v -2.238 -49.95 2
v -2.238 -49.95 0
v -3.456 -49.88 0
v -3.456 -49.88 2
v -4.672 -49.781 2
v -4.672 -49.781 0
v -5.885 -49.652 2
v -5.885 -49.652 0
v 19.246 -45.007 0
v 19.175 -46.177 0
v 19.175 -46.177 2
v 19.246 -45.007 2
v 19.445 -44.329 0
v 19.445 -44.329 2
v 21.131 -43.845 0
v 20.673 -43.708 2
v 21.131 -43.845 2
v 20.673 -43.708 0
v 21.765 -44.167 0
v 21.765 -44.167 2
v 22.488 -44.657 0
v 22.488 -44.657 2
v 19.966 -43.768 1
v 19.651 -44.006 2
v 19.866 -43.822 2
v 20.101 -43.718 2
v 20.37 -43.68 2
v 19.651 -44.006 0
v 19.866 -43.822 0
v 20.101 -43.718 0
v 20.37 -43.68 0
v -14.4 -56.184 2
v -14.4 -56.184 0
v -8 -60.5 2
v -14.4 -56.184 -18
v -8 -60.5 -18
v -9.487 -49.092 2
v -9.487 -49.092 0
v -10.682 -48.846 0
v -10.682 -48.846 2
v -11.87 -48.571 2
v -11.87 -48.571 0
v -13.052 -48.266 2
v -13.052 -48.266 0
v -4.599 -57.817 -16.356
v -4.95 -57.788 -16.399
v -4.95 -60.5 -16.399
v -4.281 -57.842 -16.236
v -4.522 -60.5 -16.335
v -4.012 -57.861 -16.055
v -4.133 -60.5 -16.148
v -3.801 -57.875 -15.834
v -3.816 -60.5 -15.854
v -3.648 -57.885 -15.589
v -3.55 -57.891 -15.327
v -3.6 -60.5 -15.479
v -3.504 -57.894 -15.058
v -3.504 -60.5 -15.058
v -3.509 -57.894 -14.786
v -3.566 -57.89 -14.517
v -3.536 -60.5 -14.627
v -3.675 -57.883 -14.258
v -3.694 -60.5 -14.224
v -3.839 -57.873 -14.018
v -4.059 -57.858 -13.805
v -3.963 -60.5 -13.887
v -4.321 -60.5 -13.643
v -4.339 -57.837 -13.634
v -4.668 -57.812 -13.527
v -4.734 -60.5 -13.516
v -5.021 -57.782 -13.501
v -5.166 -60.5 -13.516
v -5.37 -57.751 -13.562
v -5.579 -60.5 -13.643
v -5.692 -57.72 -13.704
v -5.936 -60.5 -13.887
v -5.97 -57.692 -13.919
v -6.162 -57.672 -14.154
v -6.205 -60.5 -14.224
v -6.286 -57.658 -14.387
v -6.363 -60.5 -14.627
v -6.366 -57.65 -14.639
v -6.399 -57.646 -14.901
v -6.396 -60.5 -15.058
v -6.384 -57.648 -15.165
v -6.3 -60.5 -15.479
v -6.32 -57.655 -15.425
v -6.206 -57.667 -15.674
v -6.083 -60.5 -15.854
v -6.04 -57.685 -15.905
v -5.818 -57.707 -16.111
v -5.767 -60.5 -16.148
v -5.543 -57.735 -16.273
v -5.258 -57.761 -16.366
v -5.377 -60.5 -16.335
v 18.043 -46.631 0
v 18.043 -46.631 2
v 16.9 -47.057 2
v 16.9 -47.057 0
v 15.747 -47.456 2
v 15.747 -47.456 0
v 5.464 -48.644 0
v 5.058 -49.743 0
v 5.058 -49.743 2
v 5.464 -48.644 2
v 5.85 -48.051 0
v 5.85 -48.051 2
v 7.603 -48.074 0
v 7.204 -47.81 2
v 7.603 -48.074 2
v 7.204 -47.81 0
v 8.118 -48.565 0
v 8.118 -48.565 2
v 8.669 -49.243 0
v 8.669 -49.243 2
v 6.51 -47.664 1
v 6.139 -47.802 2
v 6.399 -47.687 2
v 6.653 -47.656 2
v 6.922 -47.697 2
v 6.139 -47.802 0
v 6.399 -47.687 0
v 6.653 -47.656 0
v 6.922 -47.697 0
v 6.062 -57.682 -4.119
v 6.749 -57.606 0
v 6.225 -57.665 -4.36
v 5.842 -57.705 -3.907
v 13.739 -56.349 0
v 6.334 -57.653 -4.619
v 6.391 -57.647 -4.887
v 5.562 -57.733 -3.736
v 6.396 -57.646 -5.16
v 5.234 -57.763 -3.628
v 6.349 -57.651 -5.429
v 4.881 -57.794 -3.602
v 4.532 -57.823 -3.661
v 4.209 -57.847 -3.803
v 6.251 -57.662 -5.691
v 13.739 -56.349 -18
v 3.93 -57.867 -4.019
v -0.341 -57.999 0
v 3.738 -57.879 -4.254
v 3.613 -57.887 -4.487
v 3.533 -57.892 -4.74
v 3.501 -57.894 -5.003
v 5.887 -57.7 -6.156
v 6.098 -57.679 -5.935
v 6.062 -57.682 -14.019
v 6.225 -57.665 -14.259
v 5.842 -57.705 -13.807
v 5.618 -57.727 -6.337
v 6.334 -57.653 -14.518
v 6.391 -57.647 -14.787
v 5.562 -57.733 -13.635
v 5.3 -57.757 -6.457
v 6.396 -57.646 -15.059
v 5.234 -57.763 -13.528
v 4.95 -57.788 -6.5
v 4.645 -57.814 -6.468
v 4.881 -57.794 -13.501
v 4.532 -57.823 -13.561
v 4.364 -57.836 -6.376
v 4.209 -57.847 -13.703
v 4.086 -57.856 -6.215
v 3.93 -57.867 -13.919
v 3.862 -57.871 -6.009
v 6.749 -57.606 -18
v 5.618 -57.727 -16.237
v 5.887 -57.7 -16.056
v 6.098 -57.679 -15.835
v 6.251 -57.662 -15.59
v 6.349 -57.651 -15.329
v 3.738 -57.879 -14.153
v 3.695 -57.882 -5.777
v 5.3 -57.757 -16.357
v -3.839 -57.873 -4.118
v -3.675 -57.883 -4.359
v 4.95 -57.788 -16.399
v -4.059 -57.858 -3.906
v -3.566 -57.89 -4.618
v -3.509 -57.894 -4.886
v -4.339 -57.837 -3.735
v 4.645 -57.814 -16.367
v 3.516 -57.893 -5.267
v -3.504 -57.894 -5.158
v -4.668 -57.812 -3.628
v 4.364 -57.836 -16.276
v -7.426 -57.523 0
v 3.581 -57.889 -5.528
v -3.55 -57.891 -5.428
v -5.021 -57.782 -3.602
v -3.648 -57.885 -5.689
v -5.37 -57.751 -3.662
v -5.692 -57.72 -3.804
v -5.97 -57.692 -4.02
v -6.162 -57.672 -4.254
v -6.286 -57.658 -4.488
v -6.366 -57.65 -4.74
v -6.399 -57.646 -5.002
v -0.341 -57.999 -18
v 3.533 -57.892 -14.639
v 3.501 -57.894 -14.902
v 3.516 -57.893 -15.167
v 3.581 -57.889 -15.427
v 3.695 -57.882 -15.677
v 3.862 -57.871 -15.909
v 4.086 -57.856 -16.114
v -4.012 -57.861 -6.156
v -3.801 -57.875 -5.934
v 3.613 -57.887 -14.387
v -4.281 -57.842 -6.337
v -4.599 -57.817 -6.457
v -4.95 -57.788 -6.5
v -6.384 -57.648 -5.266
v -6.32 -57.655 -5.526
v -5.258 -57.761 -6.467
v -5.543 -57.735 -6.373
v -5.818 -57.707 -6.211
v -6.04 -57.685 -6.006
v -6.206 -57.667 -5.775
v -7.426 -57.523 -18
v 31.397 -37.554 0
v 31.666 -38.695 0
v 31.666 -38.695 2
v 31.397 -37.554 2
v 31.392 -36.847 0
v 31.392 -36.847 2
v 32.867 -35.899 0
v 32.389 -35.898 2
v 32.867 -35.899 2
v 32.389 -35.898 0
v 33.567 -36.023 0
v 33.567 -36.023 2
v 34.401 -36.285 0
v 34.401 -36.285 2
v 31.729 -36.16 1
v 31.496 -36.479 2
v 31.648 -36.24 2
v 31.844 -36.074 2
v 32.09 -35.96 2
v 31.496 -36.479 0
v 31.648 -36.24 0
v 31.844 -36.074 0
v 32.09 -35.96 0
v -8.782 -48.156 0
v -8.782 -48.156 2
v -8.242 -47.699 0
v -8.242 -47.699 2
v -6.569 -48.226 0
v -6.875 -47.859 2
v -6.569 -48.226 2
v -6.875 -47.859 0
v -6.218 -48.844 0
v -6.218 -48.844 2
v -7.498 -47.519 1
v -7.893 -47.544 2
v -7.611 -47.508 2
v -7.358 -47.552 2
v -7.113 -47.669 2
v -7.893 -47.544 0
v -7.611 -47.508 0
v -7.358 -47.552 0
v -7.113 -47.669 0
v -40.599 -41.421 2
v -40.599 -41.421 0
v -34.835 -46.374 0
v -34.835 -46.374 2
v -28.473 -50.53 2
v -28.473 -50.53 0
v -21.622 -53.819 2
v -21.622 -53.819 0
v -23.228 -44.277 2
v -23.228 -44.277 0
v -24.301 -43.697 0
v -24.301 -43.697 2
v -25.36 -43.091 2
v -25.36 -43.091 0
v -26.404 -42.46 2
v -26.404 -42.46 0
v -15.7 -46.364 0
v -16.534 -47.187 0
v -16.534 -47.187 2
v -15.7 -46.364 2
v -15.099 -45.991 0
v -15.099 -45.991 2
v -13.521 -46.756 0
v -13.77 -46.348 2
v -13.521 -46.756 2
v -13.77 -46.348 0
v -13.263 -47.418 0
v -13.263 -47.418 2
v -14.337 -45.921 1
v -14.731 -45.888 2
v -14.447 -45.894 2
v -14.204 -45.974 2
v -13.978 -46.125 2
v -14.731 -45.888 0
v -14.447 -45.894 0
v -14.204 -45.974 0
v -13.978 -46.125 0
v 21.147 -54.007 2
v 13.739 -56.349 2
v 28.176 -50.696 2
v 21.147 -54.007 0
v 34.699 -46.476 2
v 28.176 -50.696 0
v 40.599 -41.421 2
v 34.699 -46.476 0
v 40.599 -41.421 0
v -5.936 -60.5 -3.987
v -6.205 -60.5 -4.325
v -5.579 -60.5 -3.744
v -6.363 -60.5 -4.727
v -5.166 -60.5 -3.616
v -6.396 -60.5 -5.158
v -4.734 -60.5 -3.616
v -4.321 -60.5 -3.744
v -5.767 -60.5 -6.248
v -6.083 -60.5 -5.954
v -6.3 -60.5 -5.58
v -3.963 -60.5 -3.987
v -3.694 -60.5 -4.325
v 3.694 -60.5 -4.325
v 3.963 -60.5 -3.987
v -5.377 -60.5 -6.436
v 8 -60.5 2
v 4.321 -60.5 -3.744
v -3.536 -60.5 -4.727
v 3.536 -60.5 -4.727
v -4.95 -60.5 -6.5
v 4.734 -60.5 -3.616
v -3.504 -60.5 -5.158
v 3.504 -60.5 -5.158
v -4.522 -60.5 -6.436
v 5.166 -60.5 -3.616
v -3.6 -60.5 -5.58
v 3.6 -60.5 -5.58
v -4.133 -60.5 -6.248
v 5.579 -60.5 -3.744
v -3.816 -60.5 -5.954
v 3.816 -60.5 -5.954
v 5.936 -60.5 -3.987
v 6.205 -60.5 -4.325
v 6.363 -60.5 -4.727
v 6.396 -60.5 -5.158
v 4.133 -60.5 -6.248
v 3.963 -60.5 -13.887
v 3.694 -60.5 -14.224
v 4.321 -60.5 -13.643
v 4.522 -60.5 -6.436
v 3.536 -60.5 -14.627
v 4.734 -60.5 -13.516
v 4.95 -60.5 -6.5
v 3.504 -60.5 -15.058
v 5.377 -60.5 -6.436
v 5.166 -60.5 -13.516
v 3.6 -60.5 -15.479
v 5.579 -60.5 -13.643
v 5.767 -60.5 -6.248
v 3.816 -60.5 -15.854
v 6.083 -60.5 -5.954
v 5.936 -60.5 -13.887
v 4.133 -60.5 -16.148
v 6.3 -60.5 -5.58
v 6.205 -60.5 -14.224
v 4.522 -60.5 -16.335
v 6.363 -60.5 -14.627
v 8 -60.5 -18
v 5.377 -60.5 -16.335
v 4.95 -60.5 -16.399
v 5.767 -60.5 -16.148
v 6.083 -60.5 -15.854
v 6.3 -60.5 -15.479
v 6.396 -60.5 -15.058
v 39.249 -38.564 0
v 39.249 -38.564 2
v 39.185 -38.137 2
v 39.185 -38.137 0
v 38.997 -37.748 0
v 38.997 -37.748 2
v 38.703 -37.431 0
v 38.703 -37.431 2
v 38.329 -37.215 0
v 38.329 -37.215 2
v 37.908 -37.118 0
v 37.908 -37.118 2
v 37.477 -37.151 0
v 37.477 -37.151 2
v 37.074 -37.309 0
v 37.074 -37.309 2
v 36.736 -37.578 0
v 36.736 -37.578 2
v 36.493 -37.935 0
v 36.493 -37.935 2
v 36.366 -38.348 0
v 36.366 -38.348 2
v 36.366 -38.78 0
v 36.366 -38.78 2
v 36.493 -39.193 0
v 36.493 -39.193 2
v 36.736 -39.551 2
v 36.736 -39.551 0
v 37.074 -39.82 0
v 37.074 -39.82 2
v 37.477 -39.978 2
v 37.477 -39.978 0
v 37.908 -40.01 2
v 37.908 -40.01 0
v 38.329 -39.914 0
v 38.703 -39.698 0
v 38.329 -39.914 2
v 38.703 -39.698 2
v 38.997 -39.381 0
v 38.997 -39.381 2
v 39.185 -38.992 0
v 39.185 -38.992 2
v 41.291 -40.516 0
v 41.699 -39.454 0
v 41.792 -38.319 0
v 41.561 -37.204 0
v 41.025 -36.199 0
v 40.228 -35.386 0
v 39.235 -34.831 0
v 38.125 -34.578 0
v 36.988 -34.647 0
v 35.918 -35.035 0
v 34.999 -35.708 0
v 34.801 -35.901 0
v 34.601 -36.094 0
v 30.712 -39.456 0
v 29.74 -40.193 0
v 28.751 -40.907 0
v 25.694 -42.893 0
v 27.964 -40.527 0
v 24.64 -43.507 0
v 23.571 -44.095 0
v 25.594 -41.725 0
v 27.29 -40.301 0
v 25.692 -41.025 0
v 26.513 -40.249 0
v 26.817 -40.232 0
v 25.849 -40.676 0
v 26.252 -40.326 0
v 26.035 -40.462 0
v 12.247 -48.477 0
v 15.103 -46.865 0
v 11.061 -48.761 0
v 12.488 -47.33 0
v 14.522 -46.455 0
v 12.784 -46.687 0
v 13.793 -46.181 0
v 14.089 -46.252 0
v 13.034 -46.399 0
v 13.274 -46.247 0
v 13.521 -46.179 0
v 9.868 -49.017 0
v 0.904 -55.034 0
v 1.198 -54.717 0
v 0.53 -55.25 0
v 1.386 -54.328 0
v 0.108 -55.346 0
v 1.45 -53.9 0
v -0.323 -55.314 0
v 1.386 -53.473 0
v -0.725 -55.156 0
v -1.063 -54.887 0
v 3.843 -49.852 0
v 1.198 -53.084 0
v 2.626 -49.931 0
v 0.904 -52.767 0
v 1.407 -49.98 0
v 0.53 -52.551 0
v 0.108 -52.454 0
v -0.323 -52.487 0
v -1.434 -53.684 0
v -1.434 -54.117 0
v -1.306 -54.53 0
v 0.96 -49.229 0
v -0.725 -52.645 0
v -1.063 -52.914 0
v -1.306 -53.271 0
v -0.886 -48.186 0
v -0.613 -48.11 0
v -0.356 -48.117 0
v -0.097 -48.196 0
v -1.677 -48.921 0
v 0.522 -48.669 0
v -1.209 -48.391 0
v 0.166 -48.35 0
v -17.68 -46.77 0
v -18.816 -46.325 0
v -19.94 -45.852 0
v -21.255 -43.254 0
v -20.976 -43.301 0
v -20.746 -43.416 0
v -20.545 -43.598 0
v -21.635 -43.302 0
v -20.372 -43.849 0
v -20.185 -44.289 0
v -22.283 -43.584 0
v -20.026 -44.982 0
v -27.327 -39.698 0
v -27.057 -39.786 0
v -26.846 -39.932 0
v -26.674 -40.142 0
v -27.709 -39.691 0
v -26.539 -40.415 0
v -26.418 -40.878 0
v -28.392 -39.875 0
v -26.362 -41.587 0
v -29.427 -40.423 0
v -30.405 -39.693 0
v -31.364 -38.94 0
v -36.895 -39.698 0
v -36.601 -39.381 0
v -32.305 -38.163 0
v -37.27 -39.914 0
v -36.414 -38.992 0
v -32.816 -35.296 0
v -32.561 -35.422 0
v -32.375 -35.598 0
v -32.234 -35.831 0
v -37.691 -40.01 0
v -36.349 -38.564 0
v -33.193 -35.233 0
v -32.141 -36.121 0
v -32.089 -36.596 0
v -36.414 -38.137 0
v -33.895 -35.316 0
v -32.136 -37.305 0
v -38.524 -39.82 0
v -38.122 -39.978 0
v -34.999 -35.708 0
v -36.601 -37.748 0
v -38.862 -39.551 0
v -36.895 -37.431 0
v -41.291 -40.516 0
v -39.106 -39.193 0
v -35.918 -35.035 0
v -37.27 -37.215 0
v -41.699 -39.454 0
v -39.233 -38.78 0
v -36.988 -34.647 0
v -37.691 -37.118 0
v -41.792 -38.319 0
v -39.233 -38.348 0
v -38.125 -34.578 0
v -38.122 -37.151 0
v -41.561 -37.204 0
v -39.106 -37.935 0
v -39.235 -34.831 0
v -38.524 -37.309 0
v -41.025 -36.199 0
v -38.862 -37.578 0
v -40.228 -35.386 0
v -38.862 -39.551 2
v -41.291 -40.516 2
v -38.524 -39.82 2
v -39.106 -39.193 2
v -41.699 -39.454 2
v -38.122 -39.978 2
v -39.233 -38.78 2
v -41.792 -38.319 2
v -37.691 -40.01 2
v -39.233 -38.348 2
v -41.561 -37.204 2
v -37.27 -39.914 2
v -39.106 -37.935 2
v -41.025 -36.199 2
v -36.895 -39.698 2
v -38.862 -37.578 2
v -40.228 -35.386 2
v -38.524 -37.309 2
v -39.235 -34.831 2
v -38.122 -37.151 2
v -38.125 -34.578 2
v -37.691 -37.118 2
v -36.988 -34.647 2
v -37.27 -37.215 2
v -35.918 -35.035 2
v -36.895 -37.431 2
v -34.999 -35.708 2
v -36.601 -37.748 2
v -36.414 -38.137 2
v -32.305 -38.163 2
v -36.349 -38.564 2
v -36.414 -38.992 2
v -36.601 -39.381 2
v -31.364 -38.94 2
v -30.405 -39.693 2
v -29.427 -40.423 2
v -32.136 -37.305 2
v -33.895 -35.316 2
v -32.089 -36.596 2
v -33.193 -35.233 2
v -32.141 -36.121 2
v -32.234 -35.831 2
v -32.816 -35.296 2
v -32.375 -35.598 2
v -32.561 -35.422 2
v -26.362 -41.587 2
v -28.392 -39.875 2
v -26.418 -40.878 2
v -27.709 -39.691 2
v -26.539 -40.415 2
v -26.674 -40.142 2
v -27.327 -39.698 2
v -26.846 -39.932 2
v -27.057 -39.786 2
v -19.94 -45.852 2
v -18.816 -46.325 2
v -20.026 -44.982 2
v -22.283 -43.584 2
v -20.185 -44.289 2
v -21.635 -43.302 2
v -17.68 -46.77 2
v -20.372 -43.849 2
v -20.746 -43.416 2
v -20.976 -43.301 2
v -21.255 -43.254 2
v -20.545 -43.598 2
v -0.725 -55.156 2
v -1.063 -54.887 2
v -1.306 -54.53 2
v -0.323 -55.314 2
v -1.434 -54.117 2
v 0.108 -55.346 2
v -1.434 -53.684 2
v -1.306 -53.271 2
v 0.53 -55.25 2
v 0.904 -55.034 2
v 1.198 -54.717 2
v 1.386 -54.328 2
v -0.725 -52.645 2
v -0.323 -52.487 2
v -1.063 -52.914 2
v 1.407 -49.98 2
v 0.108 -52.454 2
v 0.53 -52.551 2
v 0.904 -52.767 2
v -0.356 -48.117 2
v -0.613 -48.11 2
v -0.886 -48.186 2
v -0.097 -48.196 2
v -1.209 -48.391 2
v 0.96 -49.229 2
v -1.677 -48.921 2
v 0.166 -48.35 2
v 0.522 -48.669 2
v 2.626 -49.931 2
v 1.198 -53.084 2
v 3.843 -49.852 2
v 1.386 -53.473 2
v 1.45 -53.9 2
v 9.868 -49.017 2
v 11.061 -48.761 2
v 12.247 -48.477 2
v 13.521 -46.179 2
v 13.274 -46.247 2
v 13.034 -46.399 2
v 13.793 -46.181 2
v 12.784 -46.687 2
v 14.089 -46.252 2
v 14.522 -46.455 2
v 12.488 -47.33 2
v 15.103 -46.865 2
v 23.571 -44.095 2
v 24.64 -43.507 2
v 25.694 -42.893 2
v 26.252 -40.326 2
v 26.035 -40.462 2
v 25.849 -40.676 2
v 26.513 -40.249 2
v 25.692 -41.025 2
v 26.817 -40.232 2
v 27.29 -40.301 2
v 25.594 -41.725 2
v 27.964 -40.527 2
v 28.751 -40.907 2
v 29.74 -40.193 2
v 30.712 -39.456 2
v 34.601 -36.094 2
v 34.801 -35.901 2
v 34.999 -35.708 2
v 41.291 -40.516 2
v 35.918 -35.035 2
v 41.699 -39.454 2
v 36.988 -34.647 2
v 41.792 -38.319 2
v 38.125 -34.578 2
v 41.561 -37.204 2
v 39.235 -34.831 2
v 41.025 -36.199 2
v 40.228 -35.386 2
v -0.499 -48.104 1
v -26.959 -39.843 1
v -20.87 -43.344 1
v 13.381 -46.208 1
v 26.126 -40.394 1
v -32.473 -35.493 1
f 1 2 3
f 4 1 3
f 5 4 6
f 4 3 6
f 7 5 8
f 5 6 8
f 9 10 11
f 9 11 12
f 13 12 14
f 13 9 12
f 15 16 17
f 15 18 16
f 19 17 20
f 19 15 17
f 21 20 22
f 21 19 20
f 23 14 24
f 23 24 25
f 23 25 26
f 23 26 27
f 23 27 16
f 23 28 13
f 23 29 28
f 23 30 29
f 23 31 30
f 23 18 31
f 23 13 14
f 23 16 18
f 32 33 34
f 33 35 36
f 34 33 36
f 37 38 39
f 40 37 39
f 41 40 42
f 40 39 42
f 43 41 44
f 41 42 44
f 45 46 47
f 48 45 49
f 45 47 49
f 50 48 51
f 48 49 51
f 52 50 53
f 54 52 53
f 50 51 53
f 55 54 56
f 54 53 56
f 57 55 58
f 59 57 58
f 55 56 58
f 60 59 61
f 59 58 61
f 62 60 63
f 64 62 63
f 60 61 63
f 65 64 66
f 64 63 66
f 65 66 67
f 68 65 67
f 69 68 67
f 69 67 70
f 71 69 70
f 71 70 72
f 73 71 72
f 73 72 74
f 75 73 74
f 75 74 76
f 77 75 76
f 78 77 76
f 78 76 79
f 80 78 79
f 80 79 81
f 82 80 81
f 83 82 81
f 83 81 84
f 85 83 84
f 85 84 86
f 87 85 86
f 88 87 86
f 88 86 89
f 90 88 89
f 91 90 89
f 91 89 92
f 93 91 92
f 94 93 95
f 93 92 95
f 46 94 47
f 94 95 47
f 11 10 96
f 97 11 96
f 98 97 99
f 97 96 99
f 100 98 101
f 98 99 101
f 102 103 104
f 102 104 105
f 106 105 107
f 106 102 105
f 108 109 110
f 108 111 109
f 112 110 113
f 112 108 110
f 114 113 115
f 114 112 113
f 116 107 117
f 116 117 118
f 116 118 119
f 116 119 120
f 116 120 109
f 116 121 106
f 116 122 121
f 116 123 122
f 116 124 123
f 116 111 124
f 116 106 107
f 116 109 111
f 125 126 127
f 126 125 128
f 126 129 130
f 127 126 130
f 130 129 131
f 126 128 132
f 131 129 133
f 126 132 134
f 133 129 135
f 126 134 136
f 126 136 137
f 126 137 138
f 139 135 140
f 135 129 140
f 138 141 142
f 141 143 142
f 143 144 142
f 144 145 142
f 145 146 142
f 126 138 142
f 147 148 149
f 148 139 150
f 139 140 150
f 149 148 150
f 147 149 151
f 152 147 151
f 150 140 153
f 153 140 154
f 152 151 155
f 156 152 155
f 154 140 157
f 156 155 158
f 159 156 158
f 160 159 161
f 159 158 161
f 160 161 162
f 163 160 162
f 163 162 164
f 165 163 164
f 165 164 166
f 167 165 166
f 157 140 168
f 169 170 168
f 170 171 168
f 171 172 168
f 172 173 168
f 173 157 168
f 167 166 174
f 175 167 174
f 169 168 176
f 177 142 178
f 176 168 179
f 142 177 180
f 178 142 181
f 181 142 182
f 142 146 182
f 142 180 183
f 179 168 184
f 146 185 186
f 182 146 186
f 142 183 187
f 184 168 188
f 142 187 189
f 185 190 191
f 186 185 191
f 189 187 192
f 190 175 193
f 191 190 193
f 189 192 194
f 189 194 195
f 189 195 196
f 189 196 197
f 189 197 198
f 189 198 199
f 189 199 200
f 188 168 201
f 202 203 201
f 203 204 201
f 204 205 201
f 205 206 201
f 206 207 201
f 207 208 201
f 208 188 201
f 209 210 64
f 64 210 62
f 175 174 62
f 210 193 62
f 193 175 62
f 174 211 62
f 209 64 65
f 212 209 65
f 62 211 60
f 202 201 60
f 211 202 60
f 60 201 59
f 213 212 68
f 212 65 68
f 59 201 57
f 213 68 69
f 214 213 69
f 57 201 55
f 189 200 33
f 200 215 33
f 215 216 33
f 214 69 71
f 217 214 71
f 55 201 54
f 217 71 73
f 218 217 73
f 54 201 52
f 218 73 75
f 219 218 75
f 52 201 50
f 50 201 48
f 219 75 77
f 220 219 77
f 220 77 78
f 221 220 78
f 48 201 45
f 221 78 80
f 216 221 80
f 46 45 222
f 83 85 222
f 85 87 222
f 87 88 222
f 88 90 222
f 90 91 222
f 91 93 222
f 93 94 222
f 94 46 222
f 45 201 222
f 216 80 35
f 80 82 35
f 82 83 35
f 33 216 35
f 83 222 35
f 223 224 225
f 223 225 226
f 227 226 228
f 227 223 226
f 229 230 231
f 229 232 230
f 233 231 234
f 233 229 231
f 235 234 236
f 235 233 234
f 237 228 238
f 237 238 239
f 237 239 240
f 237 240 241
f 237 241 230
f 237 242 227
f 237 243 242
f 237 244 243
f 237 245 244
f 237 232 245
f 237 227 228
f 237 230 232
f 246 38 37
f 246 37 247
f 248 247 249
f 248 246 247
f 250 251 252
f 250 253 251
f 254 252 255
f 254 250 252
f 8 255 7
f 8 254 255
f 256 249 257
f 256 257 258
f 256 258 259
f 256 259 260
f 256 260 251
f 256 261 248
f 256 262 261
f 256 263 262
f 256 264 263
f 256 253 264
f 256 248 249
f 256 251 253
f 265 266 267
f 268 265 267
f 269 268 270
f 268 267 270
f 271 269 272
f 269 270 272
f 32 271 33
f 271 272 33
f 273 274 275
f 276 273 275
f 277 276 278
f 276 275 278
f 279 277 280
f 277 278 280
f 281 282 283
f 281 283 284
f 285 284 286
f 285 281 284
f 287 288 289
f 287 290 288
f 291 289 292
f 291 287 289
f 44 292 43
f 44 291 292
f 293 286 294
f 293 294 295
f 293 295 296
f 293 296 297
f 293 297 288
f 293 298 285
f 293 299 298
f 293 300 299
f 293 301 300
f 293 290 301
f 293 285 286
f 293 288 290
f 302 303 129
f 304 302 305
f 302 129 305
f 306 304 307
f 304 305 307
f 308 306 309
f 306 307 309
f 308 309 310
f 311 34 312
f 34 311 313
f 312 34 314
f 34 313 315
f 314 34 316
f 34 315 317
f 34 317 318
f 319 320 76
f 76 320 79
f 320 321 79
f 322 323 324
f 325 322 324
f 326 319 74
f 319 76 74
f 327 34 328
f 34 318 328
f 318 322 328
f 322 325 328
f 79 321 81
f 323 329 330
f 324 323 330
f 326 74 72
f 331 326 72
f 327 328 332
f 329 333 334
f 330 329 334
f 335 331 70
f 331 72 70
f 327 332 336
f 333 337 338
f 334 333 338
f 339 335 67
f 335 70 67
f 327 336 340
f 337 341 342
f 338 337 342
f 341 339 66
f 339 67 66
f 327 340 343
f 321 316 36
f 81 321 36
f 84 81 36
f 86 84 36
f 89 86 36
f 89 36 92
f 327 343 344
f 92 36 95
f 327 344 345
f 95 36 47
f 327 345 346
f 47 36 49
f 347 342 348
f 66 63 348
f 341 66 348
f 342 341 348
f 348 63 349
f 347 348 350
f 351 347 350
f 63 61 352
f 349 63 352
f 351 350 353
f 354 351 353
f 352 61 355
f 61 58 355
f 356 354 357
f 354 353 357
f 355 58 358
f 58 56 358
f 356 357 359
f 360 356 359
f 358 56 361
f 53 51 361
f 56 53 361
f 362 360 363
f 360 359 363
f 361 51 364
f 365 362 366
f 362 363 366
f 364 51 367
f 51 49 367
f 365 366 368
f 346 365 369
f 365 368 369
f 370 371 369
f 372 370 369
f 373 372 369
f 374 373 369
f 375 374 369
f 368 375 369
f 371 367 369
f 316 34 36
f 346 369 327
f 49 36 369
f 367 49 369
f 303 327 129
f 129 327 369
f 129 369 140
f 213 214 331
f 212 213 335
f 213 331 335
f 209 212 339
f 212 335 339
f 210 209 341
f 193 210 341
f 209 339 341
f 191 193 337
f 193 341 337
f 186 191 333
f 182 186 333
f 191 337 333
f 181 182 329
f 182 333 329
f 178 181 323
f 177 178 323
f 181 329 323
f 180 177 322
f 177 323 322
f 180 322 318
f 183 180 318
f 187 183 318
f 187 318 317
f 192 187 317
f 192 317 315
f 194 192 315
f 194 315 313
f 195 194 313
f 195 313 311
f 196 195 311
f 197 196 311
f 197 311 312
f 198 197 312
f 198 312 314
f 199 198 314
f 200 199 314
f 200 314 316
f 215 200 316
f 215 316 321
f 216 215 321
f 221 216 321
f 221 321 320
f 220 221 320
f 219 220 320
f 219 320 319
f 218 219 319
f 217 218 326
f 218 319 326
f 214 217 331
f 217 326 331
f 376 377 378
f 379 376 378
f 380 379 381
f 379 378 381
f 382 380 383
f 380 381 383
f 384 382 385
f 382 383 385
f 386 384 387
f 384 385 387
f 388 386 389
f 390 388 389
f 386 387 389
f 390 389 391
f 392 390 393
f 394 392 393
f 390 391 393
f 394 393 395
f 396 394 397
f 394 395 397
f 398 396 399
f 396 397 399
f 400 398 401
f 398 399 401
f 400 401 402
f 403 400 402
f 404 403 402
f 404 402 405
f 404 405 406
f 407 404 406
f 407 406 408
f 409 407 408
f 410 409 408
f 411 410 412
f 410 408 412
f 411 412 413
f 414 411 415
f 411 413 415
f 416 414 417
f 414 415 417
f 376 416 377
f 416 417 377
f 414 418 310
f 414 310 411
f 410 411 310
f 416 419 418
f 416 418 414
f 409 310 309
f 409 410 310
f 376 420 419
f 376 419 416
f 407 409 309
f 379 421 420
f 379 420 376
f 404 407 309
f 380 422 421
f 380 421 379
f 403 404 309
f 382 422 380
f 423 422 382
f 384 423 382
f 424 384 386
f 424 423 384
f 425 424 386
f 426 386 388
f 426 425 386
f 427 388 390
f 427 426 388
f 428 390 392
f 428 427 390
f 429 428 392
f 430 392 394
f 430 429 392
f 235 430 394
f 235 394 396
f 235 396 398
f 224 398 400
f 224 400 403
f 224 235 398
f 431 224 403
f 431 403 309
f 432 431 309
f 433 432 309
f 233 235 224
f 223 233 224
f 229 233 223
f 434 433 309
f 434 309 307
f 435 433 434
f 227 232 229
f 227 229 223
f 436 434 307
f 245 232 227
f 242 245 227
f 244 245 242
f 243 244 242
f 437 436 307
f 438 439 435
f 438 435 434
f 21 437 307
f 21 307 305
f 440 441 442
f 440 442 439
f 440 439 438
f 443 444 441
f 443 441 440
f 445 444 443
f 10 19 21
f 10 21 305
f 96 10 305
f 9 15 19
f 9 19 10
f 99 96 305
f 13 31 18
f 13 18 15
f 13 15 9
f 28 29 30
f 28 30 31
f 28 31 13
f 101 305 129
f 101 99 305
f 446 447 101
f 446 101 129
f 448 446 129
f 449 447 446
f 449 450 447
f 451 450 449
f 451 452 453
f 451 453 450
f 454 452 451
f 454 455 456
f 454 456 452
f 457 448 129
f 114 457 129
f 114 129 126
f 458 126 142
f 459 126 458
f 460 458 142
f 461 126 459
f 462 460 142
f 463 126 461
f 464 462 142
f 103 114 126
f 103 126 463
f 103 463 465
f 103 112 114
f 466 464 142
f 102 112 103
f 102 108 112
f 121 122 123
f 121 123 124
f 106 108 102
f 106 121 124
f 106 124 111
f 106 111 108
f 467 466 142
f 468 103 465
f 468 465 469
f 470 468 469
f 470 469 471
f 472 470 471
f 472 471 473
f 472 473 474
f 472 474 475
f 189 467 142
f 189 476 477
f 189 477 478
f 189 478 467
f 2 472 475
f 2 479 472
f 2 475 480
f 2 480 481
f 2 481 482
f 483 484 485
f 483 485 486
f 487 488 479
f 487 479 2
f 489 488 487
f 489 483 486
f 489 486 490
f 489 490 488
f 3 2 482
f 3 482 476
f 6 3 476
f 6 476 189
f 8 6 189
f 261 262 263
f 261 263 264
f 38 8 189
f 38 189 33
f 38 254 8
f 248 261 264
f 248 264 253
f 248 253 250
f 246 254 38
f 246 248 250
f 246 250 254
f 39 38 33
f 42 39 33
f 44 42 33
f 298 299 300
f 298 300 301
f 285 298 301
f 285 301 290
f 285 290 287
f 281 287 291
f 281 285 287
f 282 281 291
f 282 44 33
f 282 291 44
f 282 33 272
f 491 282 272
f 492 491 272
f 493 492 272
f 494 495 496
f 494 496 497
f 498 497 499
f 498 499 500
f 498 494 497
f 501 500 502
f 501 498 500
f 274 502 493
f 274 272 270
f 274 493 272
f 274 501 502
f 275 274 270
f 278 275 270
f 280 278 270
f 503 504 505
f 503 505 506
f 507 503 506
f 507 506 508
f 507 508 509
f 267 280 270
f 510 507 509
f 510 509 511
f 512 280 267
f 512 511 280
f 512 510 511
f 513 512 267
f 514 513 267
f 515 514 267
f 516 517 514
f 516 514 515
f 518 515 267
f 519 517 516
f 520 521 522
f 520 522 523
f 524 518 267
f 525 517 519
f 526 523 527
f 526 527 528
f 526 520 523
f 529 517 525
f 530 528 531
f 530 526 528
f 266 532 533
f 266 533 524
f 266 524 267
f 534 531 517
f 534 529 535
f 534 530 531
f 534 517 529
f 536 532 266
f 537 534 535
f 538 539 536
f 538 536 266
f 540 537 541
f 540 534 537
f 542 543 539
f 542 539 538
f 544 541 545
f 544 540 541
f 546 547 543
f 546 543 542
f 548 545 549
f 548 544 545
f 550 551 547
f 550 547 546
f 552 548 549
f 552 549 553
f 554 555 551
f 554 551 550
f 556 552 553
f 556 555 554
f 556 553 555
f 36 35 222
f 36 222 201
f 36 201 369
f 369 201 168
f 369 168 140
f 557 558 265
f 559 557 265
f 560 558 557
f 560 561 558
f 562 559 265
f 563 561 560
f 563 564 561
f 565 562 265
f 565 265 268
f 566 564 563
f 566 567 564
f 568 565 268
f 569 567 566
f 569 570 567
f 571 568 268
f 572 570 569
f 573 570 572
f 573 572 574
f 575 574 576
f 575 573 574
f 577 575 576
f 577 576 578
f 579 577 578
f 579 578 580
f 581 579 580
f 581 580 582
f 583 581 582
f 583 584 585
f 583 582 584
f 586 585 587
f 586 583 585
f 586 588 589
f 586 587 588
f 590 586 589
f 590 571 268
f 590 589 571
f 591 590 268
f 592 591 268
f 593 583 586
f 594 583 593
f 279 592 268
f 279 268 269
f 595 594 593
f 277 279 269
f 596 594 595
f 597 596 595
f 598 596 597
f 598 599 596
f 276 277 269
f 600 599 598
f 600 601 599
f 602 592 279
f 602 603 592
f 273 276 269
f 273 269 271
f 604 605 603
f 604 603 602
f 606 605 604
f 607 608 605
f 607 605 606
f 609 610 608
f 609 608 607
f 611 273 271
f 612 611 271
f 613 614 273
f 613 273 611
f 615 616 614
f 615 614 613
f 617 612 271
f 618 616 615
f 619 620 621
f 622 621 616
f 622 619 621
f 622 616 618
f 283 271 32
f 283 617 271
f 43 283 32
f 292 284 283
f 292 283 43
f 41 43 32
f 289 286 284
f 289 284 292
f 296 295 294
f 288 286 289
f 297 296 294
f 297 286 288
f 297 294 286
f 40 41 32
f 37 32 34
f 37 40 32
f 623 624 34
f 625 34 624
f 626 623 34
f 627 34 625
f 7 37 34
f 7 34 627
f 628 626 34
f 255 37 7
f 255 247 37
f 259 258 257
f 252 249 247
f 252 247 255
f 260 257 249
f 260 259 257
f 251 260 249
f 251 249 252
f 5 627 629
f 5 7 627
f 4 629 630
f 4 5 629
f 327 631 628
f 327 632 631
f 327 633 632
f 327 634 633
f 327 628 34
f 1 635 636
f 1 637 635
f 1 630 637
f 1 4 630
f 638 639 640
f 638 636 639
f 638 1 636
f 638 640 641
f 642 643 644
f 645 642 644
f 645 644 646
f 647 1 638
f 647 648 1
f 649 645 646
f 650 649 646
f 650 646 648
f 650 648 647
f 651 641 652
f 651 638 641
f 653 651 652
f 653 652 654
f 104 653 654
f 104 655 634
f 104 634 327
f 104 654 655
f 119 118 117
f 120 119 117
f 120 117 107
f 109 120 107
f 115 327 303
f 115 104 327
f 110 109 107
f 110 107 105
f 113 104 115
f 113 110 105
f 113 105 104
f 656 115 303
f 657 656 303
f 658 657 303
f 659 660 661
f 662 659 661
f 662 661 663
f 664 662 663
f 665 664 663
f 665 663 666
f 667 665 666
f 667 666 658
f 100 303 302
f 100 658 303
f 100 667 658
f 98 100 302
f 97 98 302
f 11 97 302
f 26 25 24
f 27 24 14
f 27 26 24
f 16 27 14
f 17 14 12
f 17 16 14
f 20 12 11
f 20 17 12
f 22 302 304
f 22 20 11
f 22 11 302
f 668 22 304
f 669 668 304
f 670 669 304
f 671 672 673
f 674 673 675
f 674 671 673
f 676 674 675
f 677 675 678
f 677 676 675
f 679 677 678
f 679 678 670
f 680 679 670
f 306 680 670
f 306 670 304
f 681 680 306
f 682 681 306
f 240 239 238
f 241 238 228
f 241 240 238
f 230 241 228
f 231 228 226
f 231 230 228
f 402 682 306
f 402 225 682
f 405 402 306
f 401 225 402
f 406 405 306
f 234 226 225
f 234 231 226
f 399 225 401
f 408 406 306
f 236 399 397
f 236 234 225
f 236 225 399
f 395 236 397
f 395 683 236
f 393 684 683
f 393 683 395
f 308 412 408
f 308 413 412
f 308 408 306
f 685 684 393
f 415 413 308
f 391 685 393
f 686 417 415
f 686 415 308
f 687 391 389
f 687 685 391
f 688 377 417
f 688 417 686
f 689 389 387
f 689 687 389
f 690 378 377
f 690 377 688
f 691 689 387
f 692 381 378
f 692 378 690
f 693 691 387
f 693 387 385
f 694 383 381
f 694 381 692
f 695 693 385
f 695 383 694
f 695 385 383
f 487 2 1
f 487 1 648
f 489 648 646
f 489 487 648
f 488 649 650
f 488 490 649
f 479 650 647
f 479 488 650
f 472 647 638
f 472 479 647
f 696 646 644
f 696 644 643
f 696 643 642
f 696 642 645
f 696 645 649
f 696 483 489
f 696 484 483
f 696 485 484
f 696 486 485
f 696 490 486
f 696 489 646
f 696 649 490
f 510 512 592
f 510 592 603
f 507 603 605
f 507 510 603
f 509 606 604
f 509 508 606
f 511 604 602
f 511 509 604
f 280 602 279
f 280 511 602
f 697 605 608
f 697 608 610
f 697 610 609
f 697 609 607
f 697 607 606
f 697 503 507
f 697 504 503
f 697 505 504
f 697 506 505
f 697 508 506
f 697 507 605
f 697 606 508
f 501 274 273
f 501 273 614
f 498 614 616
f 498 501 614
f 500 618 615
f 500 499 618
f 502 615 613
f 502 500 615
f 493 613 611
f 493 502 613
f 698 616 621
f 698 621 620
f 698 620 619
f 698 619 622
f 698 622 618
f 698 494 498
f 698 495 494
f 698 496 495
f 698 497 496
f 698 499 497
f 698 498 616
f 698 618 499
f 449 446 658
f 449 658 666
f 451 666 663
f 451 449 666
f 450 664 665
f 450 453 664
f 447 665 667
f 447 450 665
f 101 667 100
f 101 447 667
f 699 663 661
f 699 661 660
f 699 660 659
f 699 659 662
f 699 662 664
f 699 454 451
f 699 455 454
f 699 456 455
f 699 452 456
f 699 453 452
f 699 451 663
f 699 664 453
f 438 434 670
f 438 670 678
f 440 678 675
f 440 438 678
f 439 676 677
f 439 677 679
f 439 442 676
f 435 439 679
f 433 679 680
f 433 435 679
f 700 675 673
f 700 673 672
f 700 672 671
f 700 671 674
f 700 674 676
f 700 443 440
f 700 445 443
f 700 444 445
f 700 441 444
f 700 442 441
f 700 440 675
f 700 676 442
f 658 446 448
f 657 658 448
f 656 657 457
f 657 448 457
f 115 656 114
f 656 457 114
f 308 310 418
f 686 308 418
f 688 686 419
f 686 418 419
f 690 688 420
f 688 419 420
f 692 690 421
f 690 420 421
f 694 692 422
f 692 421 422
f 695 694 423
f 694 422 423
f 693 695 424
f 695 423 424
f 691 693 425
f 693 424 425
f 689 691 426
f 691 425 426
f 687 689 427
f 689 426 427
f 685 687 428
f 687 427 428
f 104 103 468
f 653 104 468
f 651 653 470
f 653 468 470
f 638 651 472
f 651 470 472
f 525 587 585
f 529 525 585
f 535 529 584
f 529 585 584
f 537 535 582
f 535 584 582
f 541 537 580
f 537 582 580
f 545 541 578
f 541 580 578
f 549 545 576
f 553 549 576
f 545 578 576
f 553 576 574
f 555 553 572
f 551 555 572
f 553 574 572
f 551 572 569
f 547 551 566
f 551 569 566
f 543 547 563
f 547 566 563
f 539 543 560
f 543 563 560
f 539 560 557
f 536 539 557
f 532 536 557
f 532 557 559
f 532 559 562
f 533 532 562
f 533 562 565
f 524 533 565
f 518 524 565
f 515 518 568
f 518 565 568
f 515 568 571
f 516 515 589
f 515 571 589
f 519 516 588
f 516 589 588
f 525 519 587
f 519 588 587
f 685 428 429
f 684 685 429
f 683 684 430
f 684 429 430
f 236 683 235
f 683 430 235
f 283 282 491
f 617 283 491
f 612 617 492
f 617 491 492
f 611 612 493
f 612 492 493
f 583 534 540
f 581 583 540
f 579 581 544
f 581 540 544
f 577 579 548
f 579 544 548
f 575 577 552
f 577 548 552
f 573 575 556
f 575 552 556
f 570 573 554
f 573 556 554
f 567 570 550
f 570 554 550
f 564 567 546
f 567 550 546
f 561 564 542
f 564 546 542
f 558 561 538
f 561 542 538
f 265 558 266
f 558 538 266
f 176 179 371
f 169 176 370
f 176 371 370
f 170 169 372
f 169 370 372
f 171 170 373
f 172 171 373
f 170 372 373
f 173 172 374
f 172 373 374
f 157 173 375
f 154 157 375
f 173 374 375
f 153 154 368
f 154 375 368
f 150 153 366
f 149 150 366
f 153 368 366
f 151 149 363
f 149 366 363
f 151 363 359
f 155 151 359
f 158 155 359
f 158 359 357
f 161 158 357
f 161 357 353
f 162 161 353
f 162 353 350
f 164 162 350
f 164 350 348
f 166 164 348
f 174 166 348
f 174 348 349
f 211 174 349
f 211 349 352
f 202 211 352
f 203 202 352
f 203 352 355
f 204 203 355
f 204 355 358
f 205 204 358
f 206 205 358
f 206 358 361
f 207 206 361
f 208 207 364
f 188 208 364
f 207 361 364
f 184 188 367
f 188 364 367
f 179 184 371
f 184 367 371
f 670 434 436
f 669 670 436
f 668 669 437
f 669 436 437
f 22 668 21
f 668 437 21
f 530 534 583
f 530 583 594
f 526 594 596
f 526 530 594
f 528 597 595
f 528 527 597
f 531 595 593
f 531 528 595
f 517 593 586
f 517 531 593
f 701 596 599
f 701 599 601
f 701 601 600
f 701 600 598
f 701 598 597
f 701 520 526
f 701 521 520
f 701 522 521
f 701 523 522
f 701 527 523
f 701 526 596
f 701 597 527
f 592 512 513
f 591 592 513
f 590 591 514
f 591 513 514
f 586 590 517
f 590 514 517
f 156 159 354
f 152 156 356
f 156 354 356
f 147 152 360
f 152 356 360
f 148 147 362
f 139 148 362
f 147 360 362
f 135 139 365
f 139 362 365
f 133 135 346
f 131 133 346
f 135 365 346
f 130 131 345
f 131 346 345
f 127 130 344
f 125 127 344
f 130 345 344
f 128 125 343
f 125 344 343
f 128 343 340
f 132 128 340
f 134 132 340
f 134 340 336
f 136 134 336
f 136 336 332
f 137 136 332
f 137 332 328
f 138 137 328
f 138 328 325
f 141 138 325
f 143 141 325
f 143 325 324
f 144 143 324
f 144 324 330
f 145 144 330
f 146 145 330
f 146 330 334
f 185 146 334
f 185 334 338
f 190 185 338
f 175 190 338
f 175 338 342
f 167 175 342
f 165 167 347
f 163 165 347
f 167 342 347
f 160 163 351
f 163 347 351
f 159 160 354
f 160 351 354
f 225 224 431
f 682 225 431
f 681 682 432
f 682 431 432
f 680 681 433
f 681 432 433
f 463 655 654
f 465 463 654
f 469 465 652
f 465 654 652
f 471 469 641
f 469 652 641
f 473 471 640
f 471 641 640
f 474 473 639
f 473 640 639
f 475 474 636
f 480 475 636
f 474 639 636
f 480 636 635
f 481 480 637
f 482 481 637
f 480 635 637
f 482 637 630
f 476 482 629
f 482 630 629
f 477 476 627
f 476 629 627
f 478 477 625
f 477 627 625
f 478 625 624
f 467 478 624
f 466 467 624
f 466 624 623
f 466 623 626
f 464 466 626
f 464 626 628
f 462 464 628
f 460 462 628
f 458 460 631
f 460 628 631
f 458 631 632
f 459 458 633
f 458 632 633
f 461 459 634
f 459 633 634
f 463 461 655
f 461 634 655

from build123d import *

# Parameters (mm, degrees)
EXTRUDE_1_DEPTH     = 2
EXTRUDE_START       = -2
EXTRUDE_6_DEPTH     = 2
SKETCH_3_R          = 1.45
CUT_EXTRUDE_1_DEPTH = 2
EXTRUDE_START_2     = -20
EXTRUDE_7_DEPTH     = 20
SKETCH_6_R          = 1.45
CUT_EXTRUDE_2_DEPTH = 20


with BuildPart() as part:
    # 草图1 → 凸台-拉伸1 (new body)
    with BuildSketch(Plane.XY):
        with BuildLine():
            ThreePointArc((34.999399669, -35.707730574), (0, -50), (-34.999399669, -35.707730574))
            ThreePointArc((-34.999399669, -35.707730574), (-40.655970089, -35.764397047), (-40.599303617, -41.420967466))
            ThreePointArc((-40.599303617, -41.420967466), (0, -58), (40.599303617, -41.420967466))
            ThreePointArc((40.599303617, -41.420967466), (40.655970089, -35.764397047), (34.999399669, -35.707730574))
        make_face()
    extrude(amount=EXTRUDE_1_DEPTH)

    # 草图2 → 凸台-拉伸6 (add)
    with BuildSketch(Plane.XY.offset(2).offset(EXTRUDE_START)):
        with BuildLine():
            add(Edge.make_bspline(
                [(-34.999399669, -35.707730574), (-31.293036679, -34.051470167), (-32.304776642, -38.162827543)],
                knots=[0, 0, 0, 1, 1, 1], degree=2))
            ThreePointArc((-34.999399669, -35.707730574), (-33.674469744, -36.959844257), (-32.304776642, -38.162827543))
        make_face()
        with BuildLine():
            add(Edge.make_bspline(
                [(31.66559238, -38.694835046), (30.424637319, -34.829559417), (34.400675338, -36.284894051)],
                knots=[0, 0, 0, 1, 1, 1], degree=2))
            ThreePointArc((31.66559238, -38.694835046), (33.055103788, -37.514798594), (34.400675338, -36.284894051))
        make_face()
        with BuildLine():
            add(Edge.make_bspline(
                [(25.69413065, -42.893025659), (25.029188635, -38.888256343), (28.750957058, -40.906997791)],
                knots=[0, 0, 0, 1, 1, 1], degree=2))
            ThreePointArc((25.69413065, -42.893025659), (27.240649231, -41.927878905), (28.750957058, -40.906997791))
        make_face()
        with BuildLine():
            add(Edge.make_bspline(
                [(19.175043133, -46.177025899), (19.100286249, -42.118117602), (22.488462044, -44.657239893)],
                knots=[0, 0, 0, 1, 1, 1], degree=2))
            ThreePointArc((19.175043133, -46.177025899), (20.84560753, -45.44733927), (22.488462044, -44.657239893))
        make_face()
        with BuildLine():
            add(Edge.make_bspline(
                [(12.247272863, -48.476843002), (12.764294423, -44.450304307), (15.746664505, -47.455690459)],
                knots=[0, 0, 0, 1, 1, 1], degree=2))
            ThreePointArc((12.247272863, -48.476843002), (14.006277895, -47.998168502), (15.746664505, -47.455690459))
        make_face()
        with BuildLine():
            add(Edge.make_bspline(
                [(5.058473235, -49.743460359), (6.156253823, -45.835109949), (8.669254151, -49.242705373)],
                knots=[0, 0, 0, 1, 1, 1], degree=2))
            ThreePointArc((5.058473235, -49.743460359), (6.868428764, -49.526000104), (8.669254151, -49.242705373))
        make_face()
        with BuildLine():
            add(Edge.make_bspline(
                [(-2.238138968, -49.949882222), (-0.58299664, -46.243019798), (1.407073696, -49.980197515)],
                knots=[0, 0, 0, 1, 1, 1], degree=2))
            ThreePointArc((-2.238138968, -49.949882222), (-0.415809002, -49.998270999), (1.407073696, -49.980197515))
        make_face()
        with BuildLine():
            add(Edge.make_bspline(
                [(-9.487049125, -49.091709065), (-7.309821542, -45.665339966), (-5.885096092, -49.65244852)],
                knots=[0, 0, 0, 1, 1, 1], degree=2))
            ThreePointArc((-9.487049125, -49.091709065), (-7.69118452, -49.404915552), (-5.885096092, -49.65244852))
        make_face()
        with BuildLine():
            add(Edge.make_bspline(
                [(-16.5337593, -47.18723136), (-13.880850288, -44.114382693), (-13.051835275, -48.266443788)],
                knots=[0, 0, 0, 1, 1, 1], degree=2))
            ThreePointArc((-16.5337593, -47.18723136), (-14.802635794, -47.758580104), (-13.051835275, -48.266443788))
        make_face()
        with BuildLine():
            add(Edge.make_bspline(
                [(-23.228081101, -44.277039743), (-20.15603281, -41.623203943), (-19.940397248, -45.851723605)],
                knots=[0, 0, 0, 1, 1, 1], degree=2))
            ThreePointArc((-23.228081101, -44.277039743), (-21.598594585, -45.094353437), (-19.940397248, -45.851723605))
        make_face()
        with BuildLine():
            add(Edge.make_bspline(
                [(-29.427336681, -40.423159895), (-26.001624486, -38.244898865), (-26.403964274, -42.459753539)],
                knots=[0, 0, 0, 1, 1, 1], degree=2))
            ThreePointArc((-29.427336681, -40.423159895), (-27.934216832, -41.469018918), (-26.403964274, -42.459753539))
        make_face()
    extrude(amount=EXTRUDE_6_DEPTH)

    # 草图3 → 切除-拉伸1 (cut)
    with BuildSketch(Plane.XY.offset(2)):
        with Locations((-37.799351643, -38.56434902)):
            Circle(SKETCH_3_R)
        with Locations((37.799351643, -38.56434902)):
            Circle(SKETCH_3_R)
        with Locations((0, -53.900429622)):
            Circle(SKETCH_3_R)
    extrude(amount=-CUT_EXTRUDE_1_DEPTH, mode=Mode.SUBTRACT)

    # 草图5 → 凸台-拉伸7 (add)
    with BuildSketch(Plane.XY.offset(2).offset(EXTRUDE_START_2)):
        with BuildLine():
            Line((-14.400360847, -56.183890996), (-8, -60.499906827))
            Line((-8, -60.499906827), (8, -60.499906827))
            Line((8, -60.499906827), (13.738692935, -56.349341757))
            ThreePointArc((13.738692935, -56.349341757), (-0.341019933, -57.998997452), (-14.400360847, -56.183890996))
        make_face()
    extrude(amount=EXTRUDE_7_DEPTH)

    # 草图6 → 切除-拉伸2 (cut)
    with BuildSketch(Plane.XZ.offset(60.499906827)):
        with Locations((-4.94974747, -5.05)):
            Circle(SKETCH_6_R)
        with Locations((-4.94974747, -14.94949494)):
            Circle(SKETCH_6_R)
        with Locations((4.94974747, -14.94949494)):
            Circle(SKETCH_6_R)
        with Locations((4.94974747, -5.05)):
            Circle(SKETCH_6_R)
    extrude(amount=-CUT_EXTRUDE_2_DEPTH, mode=Mode.SUBTRACT)


solid = part.part
